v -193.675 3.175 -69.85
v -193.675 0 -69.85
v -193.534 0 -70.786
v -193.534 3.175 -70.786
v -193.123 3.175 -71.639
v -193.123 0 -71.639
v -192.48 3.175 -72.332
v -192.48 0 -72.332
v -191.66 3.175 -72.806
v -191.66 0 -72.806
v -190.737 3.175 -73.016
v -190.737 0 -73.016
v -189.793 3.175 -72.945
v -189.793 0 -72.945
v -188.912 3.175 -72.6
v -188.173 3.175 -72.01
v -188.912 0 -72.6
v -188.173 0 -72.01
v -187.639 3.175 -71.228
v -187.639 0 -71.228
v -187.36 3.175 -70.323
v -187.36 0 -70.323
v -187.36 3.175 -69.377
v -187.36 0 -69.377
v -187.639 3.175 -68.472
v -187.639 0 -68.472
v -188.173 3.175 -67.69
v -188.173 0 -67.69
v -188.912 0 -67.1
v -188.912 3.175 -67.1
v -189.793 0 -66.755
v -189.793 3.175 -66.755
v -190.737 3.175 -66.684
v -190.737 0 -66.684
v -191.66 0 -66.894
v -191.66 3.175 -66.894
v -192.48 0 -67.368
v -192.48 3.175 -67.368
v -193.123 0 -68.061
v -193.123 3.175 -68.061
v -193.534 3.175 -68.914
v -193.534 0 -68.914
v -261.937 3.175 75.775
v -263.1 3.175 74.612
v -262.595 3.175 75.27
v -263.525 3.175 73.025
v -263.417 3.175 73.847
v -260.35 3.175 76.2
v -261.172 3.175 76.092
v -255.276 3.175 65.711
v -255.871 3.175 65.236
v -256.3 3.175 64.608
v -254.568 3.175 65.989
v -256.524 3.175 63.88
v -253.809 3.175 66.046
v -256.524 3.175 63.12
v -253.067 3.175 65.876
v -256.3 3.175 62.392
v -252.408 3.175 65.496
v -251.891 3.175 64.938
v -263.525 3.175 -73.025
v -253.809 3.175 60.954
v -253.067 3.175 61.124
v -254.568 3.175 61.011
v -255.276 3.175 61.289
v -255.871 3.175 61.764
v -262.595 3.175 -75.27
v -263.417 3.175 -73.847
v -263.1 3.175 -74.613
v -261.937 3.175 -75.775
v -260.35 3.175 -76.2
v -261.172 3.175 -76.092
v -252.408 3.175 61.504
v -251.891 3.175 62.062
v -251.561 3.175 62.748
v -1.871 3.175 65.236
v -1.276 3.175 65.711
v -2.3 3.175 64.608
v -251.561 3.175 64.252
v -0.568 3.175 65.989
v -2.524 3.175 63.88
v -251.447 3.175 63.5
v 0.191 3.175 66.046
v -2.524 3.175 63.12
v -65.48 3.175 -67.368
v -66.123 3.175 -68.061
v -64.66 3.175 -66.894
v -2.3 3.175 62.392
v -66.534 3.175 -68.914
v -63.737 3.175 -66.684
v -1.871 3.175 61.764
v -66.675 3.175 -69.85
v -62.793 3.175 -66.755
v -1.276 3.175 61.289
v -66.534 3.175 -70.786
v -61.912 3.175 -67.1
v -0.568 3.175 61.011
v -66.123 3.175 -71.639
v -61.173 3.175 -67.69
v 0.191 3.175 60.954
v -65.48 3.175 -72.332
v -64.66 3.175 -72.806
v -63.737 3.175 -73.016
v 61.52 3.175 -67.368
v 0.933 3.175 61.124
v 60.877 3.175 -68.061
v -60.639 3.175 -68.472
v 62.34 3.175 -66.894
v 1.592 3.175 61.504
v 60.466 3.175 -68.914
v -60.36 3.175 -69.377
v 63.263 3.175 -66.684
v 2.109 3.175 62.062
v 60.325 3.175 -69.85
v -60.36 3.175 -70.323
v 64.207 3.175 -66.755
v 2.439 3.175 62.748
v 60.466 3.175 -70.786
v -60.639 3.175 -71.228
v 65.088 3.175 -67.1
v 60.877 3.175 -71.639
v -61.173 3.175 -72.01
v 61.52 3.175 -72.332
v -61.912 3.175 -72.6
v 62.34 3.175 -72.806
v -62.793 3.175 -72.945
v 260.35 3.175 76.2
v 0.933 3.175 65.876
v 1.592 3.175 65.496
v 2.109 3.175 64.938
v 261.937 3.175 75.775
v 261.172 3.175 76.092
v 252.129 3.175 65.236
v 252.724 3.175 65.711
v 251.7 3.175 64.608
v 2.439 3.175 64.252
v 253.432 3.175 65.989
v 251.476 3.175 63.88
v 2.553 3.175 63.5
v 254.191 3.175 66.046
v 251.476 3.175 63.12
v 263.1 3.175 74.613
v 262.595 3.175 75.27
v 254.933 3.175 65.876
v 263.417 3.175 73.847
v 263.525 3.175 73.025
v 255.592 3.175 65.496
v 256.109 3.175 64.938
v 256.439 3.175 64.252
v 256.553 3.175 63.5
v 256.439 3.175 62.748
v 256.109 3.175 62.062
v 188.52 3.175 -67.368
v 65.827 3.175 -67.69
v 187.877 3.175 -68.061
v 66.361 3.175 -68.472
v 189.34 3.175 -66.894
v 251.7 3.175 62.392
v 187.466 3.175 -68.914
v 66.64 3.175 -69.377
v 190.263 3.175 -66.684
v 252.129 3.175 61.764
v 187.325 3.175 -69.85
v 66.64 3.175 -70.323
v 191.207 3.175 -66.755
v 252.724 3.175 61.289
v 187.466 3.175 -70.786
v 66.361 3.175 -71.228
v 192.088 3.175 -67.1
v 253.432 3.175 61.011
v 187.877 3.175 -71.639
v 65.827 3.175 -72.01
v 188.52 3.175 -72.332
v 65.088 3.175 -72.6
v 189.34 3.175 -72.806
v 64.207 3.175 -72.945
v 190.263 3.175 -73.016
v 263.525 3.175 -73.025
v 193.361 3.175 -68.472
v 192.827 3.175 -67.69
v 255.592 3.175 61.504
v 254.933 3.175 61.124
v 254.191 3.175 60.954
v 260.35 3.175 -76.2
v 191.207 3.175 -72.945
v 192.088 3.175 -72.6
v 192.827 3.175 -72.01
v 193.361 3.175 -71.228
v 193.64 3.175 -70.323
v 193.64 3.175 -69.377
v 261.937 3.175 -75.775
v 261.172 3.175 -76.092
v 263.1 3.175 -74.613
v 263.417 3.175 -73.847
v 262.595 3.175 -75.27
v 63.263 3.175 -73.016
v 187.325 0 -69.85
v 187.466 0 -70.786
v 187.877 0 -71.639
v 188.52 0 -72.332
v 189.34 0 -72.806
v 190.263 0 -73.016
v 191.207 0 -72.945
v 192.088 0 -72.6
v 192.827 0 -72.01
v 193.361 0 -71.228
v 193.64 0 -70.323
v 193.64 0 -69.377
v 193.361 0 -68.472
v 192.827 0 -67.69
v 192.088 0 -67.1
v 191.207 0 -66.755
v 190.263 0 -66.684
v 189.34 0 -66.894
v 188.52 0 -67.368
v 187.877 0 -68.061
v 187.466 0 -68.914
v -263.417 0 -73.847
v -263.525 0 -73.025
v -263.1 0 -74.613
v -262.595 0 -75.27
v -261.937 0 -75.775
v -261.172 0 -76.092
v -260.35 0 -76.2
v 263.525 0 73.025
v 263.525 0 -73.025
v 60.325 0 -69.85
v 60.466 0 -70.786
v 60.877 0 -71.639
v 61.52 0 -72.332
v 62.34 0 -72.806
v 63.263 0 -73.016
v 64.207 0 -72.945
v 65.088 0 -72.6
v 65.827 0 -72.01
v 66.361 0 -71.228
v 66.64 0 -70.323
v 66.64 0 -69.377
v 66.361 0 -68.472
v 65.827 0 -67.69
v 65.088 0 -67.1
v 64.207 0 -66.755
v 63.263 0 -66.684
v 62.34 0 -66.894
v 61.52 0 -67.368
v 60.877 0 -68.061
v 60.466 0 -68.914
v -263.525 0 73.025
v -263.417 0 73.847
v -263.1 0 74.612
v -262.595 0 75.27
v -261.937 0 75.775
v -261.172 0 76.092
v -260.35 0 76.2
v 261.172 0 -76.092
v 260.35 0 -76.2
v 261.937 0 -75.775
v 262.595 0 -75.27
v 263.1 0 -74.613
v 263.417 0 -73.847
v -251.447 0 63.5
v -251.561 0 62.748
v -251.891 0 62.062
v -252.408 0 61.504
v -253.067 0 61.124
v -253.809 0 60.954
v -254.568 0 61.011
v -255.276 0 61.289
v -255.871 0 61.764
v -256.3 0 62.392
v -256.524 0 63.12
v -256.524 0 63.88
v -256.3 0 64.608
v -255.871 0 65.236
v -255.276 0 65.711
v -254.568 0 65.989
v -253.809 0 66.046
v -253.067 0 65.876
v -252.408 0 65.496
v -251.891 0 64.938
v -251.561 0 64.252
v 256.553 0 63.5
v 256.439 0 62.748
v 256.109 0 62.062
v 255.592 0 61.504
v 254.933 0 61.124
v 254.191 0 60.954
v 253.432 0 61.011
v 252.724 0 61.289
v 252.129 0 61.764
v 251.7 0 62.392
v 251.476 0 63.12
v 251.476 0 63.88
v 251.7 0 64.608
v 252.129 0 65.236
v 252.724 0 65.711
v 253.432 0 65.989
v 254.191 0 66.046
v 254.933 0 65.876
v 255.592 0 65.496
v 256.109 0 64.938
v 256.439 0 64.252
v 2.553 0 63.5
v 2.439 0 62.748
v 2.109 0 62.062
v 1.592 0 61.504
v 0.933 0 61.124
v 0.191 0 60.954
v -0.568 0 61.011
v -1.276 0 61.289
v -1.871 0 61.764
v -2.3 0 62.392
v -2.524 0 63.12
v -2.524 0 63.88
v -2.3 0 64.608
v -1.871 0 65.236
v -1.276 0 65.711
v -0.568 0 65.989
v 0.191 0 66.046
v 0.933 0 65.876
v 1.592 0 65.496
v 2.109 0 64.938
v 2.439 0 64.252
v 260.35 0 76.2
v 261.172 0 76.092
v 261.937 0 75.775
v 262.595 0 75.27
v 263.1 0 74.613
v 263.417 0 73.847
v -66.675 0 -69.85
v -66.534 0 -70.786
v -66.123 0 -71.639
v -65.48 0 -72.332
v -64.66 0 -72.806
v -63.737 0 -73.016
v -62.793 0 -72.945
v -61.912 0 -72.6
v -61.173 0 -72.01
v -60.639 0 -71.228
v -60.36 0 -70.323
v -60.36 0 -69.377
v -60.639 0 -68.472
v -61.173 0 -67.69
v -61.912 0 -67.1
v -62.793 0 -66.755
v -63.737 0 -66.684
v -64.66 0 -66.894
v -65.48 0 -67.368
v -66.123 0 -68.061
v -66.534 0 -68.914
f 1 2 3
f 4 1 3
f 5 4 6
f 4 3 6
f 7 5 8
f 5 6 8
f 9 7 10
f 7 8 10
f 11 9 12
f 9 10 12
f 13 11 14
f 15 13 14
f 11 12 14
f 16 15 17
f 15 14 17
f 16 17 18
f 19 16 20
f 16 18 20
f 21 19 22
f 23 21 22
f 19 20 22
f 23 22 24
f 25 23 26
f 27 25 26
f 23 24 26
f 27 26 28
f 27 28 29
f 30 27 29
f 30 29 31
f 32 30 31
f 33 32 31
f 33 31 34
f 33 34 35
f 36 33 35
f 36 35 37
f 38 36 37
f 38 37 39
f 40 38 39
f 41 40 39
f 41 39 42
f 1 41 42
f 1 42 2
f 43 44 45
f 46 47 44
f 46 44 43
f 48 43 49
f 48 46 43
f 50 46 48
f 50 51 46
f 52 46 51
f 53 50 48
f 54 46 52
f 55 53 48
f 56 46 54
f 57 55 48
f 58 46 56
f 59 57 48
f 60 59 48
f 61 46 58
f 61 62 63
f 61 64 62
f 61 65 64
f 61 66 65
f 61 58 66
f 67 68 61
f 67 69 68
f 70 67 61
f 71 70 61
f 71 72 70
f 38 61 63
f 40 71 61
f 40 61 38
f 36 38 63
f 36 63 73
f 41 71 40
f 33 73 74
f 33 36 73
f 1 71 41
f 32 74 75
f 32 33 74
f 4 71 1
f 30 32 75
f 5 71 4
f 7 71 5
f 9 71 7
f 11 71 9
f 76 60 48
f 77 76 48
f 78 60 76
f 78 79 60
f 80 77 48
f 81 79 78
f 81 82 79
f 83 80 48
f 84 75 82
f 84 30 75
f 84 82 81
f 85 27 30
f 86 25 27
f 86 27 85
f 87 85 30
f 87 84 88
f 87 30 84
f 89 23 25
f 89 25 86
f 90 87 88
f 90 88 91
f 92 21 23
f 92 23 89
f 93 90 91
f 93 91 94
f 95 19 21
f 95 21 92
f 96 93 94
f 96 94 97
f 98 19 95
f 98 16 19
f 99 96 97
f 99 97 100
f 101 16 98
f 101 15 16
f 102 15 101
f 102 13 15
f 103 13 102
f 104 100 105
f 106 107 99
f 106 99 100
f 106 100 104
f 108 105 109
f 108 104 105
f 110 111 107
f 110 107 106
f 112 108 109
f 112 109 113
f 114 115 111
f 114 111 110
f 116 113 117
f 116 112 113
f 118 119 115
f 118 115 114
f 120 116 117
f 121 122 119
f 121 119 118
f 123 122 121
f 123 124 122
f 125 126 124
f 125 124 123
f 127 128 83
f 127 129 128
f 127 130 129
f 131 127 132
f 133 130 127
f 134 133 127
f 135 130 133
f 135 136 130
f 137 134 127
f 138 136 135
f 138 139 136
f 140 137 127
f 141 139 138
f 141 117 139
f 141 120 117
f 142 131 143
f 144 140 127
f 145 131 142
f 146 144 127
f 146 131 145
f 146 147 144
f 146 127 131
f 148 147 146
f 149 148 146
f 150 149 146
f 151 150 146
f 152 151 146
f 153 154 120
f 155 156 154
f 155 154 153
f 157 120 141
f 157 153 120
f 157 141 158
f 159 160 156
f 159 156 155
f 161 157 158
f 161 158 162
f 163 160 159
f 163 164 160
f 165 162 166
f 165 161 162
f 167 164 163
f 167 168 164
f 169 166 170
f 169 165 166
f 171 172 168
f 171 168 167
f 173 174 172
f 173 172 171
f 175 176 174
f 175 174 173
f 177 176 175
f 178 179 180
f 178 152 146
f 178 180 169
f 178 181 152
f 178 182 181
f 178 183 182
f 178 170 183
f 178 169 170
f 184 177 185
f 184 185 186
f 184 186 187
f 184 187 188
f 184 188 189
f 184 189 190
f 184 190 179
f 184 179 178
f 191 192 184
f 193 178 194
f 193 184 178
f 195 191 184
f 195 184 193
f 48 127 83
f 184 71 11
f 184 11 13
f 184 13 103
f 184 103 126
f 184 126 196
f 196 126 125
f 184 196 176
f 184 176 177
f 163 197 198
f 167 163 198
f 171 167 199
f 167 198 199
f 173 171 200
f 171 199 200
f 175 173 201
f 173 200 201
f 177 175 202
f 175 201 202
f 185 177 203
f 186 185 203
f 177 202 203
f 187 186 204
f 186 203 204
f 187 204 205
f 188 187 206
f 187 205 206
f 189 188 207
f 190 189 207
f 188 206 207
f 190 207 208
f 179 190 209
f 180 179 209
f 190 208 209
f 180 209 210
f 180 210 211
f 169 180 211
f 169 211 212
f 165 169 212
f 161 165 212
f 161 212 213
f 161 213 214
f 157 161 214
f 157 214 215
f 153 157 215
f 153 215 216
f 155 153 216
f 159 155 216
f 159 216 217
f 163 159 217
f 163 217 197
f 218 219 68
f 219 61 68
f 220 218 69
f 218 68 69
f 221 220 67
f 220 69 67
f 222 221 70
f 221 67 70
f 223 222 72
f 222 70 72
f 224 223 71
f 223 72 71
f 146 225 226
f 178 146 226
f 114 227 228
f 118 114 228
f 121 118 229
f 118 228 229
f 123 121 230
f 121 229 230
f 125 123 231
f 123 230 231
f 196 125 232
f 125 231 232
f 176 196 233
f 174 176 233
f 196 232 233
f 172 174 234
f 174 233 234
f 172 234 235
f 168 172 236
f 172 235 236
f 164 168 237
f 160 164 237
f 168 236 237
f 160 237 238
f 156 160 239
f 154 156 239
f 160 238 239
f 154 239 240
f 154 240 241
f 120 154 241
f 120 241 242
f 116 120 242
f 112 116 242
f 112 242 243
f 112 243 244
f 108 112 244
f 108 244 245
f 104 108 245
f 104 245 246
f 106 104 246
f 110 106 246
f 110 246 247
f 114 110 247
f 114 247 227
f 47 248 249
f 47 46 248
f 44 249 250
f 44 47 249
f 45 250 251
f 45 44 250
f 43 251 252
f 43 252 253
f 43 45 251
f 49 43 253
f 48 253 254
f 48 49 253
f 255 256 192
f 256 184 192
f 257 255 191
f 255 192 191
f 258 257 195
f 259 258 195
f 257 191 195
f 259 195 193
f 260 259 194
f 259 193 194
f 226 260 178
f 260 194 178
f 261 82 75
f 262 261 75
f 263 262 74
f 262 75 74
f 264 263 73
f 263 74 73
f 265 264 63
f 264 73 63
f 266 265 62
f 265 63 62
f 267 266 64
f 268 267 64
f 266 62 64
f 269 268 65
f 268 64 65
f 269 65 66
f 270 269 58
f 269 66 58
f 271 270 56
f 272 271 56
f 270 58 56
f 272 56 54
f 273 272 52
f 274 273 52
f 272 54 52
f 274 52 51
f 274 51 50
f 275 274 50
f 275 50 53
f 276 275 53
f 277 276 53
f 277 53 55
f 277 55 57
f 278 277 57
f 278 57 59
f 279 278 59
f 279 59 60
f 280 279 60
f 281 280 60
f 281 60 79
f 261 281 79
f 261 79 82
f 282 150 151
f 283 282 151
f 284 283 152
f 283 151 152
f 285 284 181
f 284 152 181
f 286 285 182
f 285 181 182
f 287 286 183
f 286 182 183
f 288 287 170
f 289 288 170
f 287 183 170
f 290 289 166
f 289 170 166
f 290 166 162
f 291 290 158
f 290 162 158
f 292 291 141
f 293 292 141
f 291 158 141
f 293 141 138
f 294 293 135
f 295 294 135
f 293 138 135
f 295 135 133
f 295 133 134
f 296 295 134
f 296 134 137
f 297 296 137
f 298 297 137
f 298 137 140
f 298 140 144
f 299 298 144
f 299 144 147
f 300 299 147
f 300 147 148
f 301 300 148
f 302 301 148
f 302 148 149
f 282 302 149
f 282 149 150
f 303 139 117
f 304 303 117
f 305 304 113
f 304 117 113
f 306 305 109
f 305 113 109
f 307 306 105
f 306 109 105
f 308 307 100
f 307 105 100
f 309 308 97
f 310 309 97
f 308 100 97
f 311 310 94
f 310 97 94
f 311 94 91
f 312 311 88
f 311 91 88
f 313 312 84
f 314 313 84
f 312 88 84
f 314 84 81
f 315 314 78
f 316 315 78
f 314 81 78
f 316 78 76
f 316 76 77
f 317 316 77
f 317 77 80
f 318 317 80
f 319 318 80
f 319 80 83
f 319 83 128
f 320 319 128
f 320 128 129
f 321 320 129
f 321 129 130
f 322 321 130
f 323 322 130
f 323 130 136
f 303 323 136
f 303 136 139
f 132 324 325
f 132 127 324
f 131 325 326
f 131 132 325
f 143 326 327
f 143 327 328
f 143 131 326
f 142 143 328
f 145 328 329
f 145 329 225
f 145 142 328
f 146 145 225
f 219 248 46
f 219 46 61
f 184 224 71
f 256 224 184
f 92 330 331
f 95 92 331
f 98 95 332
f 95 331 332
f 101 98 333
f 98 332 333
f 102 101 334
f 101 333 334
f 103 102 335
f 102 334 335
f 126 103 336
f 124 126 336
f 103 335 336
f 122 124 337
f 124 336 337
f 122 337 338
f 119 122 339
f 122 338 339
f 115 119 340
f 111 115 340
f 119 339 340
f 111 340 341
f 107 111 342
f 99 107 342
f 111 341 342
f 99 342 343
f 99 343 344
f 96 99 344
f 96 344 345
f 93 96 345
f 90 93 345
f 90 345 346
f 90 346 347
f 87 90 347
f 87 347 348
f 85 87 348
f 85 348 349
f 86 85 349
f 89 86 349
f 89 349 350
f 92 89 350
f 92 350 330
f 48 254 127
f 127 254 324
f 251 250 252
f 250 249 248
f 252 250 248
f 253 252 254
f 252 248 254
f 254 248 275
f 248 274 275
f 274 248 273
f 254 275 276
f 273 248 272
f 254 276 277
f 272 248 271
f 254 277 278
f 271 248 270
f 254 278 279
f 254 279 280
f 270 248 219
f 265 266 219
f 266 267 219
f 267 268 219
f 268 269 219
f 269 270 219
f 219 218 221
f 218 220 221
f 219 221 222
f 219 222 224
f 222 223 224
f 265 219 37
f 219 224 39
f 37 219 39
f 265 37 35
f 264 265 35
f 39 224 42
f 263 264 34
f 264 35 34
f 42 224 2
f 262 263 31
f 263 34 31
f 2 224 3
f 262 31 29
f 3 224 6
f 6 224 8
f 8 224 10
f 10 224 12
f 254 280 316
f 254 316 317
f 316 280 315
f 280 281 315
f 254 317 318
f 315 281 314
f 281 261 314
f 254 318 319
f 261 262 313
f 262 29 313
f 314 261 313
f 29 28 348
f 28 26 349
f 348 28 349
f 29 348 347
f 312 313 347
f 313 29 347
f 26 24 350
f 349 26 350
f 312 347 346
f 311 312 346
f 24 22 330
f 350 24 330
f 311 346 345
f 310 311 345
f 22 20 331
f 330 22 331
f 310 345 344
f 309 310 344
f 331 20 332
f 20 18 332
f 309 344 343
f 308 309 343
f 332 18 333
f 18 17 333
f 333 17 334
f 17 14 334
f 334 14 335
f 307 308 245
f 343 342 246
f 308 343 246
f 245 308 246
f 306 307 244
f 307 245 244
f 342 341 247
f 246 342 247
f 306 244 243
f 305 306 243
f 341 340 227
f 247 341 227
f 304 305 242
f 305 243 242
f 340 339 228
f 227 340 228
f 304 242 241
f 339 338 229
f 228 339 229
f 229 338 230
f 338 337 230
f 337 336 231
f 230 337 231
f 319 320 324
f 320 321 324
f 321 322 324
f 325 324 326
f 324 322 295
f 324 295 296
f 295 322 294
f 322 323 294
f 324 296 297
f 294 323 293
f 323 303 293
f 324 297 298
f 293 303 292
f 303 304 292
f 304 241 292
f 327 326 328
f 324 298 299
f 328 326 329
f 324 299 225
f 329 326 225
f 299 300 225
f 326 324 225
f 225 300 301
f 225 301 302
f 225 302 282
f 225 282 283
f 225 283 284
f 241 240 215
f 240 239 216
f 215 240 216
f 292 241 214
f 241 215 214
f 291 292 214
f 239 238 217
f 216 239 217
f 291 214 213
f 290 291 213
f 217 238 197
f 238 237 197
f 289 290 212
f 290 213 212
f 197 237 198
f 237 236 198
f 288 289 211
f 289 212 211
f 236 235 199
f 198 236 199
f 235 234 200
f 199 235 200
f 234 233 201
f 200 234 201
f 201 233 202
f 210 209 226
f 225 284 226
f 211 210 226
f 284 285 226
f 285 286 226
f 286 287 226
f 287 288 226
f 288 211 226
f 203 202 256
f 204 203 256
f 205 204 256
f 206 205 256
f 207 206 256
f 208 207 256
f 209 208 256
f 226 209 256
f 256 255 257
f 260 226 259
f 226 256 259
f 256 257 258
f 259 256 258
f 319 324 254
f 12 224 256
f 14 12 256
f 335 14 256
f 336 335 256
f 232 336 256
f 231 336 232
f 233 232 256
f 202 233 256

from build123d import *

# Parameters (mm, degrees)
SKETCH1_W                   = 527.05
SKETCH1_H                   = 152.4
BOSS_EXTRUDE1_DEPTH         = 3.175
F_7_0_201_DIAMETER_HOLE1_D  = 5.1054
FILLET1_R                   = 3.175
F_1_4_0_25_DIAMETER_HOLE1_D = 6.35


with BuildPart() as part:
    # Sketch1 → Boss-Extrude1 (new body)
    with BuildSketch(Plane(origin=(0, 0, 0), x_dir=(1, 0, 0), z_dir=(0, 1, 0))):
        Rectangle(SKETCH1_W, SKETCH1_H)
    extrude(amount=BOSS_EXTRUDE1_DEPTH)

    # #7 (0.201) Diameter Hole1 (through all)
    with Locations(Plane(origin=(0, 0, 0), x_dir=(-1, 0, 0), z_dir=(0, -1, 0))):
        with Locations((-254, -63.5), (0, -63.5), (254, -63.5)):
            Hole(F_7_0_201_DIAMETER_HOLE1_D / 2)

    # Fillet1
    fillet1_edges = [part.edges().sort_by_distance(p)[0] for p in [
        (263.525, 1.5875, 76.2),
        (-263.525, 1.5875, 76.2),
        (-263.525, 1.5875, -76.2),
        (263.525, 1.5875, -76.2),
    ]]
    fillet(fillet1_edges, radius=FILLET1_R)

    # 1/4 (0.25) Diameter Hole1 (through all)
    with Locations(Plane(origin=(0, 3.175, 0), x_dir=(1, 0, 0), z_dir=(0, 1, 0))):
        with Locations((190.5, 69.85), (63.5, 69.85), (-63.5, 69.85), (-190.5, 69.85)):
            Hole(F_1_4_0_25_DIAMETER_HOLE1_D / 2)


solid = part.part
